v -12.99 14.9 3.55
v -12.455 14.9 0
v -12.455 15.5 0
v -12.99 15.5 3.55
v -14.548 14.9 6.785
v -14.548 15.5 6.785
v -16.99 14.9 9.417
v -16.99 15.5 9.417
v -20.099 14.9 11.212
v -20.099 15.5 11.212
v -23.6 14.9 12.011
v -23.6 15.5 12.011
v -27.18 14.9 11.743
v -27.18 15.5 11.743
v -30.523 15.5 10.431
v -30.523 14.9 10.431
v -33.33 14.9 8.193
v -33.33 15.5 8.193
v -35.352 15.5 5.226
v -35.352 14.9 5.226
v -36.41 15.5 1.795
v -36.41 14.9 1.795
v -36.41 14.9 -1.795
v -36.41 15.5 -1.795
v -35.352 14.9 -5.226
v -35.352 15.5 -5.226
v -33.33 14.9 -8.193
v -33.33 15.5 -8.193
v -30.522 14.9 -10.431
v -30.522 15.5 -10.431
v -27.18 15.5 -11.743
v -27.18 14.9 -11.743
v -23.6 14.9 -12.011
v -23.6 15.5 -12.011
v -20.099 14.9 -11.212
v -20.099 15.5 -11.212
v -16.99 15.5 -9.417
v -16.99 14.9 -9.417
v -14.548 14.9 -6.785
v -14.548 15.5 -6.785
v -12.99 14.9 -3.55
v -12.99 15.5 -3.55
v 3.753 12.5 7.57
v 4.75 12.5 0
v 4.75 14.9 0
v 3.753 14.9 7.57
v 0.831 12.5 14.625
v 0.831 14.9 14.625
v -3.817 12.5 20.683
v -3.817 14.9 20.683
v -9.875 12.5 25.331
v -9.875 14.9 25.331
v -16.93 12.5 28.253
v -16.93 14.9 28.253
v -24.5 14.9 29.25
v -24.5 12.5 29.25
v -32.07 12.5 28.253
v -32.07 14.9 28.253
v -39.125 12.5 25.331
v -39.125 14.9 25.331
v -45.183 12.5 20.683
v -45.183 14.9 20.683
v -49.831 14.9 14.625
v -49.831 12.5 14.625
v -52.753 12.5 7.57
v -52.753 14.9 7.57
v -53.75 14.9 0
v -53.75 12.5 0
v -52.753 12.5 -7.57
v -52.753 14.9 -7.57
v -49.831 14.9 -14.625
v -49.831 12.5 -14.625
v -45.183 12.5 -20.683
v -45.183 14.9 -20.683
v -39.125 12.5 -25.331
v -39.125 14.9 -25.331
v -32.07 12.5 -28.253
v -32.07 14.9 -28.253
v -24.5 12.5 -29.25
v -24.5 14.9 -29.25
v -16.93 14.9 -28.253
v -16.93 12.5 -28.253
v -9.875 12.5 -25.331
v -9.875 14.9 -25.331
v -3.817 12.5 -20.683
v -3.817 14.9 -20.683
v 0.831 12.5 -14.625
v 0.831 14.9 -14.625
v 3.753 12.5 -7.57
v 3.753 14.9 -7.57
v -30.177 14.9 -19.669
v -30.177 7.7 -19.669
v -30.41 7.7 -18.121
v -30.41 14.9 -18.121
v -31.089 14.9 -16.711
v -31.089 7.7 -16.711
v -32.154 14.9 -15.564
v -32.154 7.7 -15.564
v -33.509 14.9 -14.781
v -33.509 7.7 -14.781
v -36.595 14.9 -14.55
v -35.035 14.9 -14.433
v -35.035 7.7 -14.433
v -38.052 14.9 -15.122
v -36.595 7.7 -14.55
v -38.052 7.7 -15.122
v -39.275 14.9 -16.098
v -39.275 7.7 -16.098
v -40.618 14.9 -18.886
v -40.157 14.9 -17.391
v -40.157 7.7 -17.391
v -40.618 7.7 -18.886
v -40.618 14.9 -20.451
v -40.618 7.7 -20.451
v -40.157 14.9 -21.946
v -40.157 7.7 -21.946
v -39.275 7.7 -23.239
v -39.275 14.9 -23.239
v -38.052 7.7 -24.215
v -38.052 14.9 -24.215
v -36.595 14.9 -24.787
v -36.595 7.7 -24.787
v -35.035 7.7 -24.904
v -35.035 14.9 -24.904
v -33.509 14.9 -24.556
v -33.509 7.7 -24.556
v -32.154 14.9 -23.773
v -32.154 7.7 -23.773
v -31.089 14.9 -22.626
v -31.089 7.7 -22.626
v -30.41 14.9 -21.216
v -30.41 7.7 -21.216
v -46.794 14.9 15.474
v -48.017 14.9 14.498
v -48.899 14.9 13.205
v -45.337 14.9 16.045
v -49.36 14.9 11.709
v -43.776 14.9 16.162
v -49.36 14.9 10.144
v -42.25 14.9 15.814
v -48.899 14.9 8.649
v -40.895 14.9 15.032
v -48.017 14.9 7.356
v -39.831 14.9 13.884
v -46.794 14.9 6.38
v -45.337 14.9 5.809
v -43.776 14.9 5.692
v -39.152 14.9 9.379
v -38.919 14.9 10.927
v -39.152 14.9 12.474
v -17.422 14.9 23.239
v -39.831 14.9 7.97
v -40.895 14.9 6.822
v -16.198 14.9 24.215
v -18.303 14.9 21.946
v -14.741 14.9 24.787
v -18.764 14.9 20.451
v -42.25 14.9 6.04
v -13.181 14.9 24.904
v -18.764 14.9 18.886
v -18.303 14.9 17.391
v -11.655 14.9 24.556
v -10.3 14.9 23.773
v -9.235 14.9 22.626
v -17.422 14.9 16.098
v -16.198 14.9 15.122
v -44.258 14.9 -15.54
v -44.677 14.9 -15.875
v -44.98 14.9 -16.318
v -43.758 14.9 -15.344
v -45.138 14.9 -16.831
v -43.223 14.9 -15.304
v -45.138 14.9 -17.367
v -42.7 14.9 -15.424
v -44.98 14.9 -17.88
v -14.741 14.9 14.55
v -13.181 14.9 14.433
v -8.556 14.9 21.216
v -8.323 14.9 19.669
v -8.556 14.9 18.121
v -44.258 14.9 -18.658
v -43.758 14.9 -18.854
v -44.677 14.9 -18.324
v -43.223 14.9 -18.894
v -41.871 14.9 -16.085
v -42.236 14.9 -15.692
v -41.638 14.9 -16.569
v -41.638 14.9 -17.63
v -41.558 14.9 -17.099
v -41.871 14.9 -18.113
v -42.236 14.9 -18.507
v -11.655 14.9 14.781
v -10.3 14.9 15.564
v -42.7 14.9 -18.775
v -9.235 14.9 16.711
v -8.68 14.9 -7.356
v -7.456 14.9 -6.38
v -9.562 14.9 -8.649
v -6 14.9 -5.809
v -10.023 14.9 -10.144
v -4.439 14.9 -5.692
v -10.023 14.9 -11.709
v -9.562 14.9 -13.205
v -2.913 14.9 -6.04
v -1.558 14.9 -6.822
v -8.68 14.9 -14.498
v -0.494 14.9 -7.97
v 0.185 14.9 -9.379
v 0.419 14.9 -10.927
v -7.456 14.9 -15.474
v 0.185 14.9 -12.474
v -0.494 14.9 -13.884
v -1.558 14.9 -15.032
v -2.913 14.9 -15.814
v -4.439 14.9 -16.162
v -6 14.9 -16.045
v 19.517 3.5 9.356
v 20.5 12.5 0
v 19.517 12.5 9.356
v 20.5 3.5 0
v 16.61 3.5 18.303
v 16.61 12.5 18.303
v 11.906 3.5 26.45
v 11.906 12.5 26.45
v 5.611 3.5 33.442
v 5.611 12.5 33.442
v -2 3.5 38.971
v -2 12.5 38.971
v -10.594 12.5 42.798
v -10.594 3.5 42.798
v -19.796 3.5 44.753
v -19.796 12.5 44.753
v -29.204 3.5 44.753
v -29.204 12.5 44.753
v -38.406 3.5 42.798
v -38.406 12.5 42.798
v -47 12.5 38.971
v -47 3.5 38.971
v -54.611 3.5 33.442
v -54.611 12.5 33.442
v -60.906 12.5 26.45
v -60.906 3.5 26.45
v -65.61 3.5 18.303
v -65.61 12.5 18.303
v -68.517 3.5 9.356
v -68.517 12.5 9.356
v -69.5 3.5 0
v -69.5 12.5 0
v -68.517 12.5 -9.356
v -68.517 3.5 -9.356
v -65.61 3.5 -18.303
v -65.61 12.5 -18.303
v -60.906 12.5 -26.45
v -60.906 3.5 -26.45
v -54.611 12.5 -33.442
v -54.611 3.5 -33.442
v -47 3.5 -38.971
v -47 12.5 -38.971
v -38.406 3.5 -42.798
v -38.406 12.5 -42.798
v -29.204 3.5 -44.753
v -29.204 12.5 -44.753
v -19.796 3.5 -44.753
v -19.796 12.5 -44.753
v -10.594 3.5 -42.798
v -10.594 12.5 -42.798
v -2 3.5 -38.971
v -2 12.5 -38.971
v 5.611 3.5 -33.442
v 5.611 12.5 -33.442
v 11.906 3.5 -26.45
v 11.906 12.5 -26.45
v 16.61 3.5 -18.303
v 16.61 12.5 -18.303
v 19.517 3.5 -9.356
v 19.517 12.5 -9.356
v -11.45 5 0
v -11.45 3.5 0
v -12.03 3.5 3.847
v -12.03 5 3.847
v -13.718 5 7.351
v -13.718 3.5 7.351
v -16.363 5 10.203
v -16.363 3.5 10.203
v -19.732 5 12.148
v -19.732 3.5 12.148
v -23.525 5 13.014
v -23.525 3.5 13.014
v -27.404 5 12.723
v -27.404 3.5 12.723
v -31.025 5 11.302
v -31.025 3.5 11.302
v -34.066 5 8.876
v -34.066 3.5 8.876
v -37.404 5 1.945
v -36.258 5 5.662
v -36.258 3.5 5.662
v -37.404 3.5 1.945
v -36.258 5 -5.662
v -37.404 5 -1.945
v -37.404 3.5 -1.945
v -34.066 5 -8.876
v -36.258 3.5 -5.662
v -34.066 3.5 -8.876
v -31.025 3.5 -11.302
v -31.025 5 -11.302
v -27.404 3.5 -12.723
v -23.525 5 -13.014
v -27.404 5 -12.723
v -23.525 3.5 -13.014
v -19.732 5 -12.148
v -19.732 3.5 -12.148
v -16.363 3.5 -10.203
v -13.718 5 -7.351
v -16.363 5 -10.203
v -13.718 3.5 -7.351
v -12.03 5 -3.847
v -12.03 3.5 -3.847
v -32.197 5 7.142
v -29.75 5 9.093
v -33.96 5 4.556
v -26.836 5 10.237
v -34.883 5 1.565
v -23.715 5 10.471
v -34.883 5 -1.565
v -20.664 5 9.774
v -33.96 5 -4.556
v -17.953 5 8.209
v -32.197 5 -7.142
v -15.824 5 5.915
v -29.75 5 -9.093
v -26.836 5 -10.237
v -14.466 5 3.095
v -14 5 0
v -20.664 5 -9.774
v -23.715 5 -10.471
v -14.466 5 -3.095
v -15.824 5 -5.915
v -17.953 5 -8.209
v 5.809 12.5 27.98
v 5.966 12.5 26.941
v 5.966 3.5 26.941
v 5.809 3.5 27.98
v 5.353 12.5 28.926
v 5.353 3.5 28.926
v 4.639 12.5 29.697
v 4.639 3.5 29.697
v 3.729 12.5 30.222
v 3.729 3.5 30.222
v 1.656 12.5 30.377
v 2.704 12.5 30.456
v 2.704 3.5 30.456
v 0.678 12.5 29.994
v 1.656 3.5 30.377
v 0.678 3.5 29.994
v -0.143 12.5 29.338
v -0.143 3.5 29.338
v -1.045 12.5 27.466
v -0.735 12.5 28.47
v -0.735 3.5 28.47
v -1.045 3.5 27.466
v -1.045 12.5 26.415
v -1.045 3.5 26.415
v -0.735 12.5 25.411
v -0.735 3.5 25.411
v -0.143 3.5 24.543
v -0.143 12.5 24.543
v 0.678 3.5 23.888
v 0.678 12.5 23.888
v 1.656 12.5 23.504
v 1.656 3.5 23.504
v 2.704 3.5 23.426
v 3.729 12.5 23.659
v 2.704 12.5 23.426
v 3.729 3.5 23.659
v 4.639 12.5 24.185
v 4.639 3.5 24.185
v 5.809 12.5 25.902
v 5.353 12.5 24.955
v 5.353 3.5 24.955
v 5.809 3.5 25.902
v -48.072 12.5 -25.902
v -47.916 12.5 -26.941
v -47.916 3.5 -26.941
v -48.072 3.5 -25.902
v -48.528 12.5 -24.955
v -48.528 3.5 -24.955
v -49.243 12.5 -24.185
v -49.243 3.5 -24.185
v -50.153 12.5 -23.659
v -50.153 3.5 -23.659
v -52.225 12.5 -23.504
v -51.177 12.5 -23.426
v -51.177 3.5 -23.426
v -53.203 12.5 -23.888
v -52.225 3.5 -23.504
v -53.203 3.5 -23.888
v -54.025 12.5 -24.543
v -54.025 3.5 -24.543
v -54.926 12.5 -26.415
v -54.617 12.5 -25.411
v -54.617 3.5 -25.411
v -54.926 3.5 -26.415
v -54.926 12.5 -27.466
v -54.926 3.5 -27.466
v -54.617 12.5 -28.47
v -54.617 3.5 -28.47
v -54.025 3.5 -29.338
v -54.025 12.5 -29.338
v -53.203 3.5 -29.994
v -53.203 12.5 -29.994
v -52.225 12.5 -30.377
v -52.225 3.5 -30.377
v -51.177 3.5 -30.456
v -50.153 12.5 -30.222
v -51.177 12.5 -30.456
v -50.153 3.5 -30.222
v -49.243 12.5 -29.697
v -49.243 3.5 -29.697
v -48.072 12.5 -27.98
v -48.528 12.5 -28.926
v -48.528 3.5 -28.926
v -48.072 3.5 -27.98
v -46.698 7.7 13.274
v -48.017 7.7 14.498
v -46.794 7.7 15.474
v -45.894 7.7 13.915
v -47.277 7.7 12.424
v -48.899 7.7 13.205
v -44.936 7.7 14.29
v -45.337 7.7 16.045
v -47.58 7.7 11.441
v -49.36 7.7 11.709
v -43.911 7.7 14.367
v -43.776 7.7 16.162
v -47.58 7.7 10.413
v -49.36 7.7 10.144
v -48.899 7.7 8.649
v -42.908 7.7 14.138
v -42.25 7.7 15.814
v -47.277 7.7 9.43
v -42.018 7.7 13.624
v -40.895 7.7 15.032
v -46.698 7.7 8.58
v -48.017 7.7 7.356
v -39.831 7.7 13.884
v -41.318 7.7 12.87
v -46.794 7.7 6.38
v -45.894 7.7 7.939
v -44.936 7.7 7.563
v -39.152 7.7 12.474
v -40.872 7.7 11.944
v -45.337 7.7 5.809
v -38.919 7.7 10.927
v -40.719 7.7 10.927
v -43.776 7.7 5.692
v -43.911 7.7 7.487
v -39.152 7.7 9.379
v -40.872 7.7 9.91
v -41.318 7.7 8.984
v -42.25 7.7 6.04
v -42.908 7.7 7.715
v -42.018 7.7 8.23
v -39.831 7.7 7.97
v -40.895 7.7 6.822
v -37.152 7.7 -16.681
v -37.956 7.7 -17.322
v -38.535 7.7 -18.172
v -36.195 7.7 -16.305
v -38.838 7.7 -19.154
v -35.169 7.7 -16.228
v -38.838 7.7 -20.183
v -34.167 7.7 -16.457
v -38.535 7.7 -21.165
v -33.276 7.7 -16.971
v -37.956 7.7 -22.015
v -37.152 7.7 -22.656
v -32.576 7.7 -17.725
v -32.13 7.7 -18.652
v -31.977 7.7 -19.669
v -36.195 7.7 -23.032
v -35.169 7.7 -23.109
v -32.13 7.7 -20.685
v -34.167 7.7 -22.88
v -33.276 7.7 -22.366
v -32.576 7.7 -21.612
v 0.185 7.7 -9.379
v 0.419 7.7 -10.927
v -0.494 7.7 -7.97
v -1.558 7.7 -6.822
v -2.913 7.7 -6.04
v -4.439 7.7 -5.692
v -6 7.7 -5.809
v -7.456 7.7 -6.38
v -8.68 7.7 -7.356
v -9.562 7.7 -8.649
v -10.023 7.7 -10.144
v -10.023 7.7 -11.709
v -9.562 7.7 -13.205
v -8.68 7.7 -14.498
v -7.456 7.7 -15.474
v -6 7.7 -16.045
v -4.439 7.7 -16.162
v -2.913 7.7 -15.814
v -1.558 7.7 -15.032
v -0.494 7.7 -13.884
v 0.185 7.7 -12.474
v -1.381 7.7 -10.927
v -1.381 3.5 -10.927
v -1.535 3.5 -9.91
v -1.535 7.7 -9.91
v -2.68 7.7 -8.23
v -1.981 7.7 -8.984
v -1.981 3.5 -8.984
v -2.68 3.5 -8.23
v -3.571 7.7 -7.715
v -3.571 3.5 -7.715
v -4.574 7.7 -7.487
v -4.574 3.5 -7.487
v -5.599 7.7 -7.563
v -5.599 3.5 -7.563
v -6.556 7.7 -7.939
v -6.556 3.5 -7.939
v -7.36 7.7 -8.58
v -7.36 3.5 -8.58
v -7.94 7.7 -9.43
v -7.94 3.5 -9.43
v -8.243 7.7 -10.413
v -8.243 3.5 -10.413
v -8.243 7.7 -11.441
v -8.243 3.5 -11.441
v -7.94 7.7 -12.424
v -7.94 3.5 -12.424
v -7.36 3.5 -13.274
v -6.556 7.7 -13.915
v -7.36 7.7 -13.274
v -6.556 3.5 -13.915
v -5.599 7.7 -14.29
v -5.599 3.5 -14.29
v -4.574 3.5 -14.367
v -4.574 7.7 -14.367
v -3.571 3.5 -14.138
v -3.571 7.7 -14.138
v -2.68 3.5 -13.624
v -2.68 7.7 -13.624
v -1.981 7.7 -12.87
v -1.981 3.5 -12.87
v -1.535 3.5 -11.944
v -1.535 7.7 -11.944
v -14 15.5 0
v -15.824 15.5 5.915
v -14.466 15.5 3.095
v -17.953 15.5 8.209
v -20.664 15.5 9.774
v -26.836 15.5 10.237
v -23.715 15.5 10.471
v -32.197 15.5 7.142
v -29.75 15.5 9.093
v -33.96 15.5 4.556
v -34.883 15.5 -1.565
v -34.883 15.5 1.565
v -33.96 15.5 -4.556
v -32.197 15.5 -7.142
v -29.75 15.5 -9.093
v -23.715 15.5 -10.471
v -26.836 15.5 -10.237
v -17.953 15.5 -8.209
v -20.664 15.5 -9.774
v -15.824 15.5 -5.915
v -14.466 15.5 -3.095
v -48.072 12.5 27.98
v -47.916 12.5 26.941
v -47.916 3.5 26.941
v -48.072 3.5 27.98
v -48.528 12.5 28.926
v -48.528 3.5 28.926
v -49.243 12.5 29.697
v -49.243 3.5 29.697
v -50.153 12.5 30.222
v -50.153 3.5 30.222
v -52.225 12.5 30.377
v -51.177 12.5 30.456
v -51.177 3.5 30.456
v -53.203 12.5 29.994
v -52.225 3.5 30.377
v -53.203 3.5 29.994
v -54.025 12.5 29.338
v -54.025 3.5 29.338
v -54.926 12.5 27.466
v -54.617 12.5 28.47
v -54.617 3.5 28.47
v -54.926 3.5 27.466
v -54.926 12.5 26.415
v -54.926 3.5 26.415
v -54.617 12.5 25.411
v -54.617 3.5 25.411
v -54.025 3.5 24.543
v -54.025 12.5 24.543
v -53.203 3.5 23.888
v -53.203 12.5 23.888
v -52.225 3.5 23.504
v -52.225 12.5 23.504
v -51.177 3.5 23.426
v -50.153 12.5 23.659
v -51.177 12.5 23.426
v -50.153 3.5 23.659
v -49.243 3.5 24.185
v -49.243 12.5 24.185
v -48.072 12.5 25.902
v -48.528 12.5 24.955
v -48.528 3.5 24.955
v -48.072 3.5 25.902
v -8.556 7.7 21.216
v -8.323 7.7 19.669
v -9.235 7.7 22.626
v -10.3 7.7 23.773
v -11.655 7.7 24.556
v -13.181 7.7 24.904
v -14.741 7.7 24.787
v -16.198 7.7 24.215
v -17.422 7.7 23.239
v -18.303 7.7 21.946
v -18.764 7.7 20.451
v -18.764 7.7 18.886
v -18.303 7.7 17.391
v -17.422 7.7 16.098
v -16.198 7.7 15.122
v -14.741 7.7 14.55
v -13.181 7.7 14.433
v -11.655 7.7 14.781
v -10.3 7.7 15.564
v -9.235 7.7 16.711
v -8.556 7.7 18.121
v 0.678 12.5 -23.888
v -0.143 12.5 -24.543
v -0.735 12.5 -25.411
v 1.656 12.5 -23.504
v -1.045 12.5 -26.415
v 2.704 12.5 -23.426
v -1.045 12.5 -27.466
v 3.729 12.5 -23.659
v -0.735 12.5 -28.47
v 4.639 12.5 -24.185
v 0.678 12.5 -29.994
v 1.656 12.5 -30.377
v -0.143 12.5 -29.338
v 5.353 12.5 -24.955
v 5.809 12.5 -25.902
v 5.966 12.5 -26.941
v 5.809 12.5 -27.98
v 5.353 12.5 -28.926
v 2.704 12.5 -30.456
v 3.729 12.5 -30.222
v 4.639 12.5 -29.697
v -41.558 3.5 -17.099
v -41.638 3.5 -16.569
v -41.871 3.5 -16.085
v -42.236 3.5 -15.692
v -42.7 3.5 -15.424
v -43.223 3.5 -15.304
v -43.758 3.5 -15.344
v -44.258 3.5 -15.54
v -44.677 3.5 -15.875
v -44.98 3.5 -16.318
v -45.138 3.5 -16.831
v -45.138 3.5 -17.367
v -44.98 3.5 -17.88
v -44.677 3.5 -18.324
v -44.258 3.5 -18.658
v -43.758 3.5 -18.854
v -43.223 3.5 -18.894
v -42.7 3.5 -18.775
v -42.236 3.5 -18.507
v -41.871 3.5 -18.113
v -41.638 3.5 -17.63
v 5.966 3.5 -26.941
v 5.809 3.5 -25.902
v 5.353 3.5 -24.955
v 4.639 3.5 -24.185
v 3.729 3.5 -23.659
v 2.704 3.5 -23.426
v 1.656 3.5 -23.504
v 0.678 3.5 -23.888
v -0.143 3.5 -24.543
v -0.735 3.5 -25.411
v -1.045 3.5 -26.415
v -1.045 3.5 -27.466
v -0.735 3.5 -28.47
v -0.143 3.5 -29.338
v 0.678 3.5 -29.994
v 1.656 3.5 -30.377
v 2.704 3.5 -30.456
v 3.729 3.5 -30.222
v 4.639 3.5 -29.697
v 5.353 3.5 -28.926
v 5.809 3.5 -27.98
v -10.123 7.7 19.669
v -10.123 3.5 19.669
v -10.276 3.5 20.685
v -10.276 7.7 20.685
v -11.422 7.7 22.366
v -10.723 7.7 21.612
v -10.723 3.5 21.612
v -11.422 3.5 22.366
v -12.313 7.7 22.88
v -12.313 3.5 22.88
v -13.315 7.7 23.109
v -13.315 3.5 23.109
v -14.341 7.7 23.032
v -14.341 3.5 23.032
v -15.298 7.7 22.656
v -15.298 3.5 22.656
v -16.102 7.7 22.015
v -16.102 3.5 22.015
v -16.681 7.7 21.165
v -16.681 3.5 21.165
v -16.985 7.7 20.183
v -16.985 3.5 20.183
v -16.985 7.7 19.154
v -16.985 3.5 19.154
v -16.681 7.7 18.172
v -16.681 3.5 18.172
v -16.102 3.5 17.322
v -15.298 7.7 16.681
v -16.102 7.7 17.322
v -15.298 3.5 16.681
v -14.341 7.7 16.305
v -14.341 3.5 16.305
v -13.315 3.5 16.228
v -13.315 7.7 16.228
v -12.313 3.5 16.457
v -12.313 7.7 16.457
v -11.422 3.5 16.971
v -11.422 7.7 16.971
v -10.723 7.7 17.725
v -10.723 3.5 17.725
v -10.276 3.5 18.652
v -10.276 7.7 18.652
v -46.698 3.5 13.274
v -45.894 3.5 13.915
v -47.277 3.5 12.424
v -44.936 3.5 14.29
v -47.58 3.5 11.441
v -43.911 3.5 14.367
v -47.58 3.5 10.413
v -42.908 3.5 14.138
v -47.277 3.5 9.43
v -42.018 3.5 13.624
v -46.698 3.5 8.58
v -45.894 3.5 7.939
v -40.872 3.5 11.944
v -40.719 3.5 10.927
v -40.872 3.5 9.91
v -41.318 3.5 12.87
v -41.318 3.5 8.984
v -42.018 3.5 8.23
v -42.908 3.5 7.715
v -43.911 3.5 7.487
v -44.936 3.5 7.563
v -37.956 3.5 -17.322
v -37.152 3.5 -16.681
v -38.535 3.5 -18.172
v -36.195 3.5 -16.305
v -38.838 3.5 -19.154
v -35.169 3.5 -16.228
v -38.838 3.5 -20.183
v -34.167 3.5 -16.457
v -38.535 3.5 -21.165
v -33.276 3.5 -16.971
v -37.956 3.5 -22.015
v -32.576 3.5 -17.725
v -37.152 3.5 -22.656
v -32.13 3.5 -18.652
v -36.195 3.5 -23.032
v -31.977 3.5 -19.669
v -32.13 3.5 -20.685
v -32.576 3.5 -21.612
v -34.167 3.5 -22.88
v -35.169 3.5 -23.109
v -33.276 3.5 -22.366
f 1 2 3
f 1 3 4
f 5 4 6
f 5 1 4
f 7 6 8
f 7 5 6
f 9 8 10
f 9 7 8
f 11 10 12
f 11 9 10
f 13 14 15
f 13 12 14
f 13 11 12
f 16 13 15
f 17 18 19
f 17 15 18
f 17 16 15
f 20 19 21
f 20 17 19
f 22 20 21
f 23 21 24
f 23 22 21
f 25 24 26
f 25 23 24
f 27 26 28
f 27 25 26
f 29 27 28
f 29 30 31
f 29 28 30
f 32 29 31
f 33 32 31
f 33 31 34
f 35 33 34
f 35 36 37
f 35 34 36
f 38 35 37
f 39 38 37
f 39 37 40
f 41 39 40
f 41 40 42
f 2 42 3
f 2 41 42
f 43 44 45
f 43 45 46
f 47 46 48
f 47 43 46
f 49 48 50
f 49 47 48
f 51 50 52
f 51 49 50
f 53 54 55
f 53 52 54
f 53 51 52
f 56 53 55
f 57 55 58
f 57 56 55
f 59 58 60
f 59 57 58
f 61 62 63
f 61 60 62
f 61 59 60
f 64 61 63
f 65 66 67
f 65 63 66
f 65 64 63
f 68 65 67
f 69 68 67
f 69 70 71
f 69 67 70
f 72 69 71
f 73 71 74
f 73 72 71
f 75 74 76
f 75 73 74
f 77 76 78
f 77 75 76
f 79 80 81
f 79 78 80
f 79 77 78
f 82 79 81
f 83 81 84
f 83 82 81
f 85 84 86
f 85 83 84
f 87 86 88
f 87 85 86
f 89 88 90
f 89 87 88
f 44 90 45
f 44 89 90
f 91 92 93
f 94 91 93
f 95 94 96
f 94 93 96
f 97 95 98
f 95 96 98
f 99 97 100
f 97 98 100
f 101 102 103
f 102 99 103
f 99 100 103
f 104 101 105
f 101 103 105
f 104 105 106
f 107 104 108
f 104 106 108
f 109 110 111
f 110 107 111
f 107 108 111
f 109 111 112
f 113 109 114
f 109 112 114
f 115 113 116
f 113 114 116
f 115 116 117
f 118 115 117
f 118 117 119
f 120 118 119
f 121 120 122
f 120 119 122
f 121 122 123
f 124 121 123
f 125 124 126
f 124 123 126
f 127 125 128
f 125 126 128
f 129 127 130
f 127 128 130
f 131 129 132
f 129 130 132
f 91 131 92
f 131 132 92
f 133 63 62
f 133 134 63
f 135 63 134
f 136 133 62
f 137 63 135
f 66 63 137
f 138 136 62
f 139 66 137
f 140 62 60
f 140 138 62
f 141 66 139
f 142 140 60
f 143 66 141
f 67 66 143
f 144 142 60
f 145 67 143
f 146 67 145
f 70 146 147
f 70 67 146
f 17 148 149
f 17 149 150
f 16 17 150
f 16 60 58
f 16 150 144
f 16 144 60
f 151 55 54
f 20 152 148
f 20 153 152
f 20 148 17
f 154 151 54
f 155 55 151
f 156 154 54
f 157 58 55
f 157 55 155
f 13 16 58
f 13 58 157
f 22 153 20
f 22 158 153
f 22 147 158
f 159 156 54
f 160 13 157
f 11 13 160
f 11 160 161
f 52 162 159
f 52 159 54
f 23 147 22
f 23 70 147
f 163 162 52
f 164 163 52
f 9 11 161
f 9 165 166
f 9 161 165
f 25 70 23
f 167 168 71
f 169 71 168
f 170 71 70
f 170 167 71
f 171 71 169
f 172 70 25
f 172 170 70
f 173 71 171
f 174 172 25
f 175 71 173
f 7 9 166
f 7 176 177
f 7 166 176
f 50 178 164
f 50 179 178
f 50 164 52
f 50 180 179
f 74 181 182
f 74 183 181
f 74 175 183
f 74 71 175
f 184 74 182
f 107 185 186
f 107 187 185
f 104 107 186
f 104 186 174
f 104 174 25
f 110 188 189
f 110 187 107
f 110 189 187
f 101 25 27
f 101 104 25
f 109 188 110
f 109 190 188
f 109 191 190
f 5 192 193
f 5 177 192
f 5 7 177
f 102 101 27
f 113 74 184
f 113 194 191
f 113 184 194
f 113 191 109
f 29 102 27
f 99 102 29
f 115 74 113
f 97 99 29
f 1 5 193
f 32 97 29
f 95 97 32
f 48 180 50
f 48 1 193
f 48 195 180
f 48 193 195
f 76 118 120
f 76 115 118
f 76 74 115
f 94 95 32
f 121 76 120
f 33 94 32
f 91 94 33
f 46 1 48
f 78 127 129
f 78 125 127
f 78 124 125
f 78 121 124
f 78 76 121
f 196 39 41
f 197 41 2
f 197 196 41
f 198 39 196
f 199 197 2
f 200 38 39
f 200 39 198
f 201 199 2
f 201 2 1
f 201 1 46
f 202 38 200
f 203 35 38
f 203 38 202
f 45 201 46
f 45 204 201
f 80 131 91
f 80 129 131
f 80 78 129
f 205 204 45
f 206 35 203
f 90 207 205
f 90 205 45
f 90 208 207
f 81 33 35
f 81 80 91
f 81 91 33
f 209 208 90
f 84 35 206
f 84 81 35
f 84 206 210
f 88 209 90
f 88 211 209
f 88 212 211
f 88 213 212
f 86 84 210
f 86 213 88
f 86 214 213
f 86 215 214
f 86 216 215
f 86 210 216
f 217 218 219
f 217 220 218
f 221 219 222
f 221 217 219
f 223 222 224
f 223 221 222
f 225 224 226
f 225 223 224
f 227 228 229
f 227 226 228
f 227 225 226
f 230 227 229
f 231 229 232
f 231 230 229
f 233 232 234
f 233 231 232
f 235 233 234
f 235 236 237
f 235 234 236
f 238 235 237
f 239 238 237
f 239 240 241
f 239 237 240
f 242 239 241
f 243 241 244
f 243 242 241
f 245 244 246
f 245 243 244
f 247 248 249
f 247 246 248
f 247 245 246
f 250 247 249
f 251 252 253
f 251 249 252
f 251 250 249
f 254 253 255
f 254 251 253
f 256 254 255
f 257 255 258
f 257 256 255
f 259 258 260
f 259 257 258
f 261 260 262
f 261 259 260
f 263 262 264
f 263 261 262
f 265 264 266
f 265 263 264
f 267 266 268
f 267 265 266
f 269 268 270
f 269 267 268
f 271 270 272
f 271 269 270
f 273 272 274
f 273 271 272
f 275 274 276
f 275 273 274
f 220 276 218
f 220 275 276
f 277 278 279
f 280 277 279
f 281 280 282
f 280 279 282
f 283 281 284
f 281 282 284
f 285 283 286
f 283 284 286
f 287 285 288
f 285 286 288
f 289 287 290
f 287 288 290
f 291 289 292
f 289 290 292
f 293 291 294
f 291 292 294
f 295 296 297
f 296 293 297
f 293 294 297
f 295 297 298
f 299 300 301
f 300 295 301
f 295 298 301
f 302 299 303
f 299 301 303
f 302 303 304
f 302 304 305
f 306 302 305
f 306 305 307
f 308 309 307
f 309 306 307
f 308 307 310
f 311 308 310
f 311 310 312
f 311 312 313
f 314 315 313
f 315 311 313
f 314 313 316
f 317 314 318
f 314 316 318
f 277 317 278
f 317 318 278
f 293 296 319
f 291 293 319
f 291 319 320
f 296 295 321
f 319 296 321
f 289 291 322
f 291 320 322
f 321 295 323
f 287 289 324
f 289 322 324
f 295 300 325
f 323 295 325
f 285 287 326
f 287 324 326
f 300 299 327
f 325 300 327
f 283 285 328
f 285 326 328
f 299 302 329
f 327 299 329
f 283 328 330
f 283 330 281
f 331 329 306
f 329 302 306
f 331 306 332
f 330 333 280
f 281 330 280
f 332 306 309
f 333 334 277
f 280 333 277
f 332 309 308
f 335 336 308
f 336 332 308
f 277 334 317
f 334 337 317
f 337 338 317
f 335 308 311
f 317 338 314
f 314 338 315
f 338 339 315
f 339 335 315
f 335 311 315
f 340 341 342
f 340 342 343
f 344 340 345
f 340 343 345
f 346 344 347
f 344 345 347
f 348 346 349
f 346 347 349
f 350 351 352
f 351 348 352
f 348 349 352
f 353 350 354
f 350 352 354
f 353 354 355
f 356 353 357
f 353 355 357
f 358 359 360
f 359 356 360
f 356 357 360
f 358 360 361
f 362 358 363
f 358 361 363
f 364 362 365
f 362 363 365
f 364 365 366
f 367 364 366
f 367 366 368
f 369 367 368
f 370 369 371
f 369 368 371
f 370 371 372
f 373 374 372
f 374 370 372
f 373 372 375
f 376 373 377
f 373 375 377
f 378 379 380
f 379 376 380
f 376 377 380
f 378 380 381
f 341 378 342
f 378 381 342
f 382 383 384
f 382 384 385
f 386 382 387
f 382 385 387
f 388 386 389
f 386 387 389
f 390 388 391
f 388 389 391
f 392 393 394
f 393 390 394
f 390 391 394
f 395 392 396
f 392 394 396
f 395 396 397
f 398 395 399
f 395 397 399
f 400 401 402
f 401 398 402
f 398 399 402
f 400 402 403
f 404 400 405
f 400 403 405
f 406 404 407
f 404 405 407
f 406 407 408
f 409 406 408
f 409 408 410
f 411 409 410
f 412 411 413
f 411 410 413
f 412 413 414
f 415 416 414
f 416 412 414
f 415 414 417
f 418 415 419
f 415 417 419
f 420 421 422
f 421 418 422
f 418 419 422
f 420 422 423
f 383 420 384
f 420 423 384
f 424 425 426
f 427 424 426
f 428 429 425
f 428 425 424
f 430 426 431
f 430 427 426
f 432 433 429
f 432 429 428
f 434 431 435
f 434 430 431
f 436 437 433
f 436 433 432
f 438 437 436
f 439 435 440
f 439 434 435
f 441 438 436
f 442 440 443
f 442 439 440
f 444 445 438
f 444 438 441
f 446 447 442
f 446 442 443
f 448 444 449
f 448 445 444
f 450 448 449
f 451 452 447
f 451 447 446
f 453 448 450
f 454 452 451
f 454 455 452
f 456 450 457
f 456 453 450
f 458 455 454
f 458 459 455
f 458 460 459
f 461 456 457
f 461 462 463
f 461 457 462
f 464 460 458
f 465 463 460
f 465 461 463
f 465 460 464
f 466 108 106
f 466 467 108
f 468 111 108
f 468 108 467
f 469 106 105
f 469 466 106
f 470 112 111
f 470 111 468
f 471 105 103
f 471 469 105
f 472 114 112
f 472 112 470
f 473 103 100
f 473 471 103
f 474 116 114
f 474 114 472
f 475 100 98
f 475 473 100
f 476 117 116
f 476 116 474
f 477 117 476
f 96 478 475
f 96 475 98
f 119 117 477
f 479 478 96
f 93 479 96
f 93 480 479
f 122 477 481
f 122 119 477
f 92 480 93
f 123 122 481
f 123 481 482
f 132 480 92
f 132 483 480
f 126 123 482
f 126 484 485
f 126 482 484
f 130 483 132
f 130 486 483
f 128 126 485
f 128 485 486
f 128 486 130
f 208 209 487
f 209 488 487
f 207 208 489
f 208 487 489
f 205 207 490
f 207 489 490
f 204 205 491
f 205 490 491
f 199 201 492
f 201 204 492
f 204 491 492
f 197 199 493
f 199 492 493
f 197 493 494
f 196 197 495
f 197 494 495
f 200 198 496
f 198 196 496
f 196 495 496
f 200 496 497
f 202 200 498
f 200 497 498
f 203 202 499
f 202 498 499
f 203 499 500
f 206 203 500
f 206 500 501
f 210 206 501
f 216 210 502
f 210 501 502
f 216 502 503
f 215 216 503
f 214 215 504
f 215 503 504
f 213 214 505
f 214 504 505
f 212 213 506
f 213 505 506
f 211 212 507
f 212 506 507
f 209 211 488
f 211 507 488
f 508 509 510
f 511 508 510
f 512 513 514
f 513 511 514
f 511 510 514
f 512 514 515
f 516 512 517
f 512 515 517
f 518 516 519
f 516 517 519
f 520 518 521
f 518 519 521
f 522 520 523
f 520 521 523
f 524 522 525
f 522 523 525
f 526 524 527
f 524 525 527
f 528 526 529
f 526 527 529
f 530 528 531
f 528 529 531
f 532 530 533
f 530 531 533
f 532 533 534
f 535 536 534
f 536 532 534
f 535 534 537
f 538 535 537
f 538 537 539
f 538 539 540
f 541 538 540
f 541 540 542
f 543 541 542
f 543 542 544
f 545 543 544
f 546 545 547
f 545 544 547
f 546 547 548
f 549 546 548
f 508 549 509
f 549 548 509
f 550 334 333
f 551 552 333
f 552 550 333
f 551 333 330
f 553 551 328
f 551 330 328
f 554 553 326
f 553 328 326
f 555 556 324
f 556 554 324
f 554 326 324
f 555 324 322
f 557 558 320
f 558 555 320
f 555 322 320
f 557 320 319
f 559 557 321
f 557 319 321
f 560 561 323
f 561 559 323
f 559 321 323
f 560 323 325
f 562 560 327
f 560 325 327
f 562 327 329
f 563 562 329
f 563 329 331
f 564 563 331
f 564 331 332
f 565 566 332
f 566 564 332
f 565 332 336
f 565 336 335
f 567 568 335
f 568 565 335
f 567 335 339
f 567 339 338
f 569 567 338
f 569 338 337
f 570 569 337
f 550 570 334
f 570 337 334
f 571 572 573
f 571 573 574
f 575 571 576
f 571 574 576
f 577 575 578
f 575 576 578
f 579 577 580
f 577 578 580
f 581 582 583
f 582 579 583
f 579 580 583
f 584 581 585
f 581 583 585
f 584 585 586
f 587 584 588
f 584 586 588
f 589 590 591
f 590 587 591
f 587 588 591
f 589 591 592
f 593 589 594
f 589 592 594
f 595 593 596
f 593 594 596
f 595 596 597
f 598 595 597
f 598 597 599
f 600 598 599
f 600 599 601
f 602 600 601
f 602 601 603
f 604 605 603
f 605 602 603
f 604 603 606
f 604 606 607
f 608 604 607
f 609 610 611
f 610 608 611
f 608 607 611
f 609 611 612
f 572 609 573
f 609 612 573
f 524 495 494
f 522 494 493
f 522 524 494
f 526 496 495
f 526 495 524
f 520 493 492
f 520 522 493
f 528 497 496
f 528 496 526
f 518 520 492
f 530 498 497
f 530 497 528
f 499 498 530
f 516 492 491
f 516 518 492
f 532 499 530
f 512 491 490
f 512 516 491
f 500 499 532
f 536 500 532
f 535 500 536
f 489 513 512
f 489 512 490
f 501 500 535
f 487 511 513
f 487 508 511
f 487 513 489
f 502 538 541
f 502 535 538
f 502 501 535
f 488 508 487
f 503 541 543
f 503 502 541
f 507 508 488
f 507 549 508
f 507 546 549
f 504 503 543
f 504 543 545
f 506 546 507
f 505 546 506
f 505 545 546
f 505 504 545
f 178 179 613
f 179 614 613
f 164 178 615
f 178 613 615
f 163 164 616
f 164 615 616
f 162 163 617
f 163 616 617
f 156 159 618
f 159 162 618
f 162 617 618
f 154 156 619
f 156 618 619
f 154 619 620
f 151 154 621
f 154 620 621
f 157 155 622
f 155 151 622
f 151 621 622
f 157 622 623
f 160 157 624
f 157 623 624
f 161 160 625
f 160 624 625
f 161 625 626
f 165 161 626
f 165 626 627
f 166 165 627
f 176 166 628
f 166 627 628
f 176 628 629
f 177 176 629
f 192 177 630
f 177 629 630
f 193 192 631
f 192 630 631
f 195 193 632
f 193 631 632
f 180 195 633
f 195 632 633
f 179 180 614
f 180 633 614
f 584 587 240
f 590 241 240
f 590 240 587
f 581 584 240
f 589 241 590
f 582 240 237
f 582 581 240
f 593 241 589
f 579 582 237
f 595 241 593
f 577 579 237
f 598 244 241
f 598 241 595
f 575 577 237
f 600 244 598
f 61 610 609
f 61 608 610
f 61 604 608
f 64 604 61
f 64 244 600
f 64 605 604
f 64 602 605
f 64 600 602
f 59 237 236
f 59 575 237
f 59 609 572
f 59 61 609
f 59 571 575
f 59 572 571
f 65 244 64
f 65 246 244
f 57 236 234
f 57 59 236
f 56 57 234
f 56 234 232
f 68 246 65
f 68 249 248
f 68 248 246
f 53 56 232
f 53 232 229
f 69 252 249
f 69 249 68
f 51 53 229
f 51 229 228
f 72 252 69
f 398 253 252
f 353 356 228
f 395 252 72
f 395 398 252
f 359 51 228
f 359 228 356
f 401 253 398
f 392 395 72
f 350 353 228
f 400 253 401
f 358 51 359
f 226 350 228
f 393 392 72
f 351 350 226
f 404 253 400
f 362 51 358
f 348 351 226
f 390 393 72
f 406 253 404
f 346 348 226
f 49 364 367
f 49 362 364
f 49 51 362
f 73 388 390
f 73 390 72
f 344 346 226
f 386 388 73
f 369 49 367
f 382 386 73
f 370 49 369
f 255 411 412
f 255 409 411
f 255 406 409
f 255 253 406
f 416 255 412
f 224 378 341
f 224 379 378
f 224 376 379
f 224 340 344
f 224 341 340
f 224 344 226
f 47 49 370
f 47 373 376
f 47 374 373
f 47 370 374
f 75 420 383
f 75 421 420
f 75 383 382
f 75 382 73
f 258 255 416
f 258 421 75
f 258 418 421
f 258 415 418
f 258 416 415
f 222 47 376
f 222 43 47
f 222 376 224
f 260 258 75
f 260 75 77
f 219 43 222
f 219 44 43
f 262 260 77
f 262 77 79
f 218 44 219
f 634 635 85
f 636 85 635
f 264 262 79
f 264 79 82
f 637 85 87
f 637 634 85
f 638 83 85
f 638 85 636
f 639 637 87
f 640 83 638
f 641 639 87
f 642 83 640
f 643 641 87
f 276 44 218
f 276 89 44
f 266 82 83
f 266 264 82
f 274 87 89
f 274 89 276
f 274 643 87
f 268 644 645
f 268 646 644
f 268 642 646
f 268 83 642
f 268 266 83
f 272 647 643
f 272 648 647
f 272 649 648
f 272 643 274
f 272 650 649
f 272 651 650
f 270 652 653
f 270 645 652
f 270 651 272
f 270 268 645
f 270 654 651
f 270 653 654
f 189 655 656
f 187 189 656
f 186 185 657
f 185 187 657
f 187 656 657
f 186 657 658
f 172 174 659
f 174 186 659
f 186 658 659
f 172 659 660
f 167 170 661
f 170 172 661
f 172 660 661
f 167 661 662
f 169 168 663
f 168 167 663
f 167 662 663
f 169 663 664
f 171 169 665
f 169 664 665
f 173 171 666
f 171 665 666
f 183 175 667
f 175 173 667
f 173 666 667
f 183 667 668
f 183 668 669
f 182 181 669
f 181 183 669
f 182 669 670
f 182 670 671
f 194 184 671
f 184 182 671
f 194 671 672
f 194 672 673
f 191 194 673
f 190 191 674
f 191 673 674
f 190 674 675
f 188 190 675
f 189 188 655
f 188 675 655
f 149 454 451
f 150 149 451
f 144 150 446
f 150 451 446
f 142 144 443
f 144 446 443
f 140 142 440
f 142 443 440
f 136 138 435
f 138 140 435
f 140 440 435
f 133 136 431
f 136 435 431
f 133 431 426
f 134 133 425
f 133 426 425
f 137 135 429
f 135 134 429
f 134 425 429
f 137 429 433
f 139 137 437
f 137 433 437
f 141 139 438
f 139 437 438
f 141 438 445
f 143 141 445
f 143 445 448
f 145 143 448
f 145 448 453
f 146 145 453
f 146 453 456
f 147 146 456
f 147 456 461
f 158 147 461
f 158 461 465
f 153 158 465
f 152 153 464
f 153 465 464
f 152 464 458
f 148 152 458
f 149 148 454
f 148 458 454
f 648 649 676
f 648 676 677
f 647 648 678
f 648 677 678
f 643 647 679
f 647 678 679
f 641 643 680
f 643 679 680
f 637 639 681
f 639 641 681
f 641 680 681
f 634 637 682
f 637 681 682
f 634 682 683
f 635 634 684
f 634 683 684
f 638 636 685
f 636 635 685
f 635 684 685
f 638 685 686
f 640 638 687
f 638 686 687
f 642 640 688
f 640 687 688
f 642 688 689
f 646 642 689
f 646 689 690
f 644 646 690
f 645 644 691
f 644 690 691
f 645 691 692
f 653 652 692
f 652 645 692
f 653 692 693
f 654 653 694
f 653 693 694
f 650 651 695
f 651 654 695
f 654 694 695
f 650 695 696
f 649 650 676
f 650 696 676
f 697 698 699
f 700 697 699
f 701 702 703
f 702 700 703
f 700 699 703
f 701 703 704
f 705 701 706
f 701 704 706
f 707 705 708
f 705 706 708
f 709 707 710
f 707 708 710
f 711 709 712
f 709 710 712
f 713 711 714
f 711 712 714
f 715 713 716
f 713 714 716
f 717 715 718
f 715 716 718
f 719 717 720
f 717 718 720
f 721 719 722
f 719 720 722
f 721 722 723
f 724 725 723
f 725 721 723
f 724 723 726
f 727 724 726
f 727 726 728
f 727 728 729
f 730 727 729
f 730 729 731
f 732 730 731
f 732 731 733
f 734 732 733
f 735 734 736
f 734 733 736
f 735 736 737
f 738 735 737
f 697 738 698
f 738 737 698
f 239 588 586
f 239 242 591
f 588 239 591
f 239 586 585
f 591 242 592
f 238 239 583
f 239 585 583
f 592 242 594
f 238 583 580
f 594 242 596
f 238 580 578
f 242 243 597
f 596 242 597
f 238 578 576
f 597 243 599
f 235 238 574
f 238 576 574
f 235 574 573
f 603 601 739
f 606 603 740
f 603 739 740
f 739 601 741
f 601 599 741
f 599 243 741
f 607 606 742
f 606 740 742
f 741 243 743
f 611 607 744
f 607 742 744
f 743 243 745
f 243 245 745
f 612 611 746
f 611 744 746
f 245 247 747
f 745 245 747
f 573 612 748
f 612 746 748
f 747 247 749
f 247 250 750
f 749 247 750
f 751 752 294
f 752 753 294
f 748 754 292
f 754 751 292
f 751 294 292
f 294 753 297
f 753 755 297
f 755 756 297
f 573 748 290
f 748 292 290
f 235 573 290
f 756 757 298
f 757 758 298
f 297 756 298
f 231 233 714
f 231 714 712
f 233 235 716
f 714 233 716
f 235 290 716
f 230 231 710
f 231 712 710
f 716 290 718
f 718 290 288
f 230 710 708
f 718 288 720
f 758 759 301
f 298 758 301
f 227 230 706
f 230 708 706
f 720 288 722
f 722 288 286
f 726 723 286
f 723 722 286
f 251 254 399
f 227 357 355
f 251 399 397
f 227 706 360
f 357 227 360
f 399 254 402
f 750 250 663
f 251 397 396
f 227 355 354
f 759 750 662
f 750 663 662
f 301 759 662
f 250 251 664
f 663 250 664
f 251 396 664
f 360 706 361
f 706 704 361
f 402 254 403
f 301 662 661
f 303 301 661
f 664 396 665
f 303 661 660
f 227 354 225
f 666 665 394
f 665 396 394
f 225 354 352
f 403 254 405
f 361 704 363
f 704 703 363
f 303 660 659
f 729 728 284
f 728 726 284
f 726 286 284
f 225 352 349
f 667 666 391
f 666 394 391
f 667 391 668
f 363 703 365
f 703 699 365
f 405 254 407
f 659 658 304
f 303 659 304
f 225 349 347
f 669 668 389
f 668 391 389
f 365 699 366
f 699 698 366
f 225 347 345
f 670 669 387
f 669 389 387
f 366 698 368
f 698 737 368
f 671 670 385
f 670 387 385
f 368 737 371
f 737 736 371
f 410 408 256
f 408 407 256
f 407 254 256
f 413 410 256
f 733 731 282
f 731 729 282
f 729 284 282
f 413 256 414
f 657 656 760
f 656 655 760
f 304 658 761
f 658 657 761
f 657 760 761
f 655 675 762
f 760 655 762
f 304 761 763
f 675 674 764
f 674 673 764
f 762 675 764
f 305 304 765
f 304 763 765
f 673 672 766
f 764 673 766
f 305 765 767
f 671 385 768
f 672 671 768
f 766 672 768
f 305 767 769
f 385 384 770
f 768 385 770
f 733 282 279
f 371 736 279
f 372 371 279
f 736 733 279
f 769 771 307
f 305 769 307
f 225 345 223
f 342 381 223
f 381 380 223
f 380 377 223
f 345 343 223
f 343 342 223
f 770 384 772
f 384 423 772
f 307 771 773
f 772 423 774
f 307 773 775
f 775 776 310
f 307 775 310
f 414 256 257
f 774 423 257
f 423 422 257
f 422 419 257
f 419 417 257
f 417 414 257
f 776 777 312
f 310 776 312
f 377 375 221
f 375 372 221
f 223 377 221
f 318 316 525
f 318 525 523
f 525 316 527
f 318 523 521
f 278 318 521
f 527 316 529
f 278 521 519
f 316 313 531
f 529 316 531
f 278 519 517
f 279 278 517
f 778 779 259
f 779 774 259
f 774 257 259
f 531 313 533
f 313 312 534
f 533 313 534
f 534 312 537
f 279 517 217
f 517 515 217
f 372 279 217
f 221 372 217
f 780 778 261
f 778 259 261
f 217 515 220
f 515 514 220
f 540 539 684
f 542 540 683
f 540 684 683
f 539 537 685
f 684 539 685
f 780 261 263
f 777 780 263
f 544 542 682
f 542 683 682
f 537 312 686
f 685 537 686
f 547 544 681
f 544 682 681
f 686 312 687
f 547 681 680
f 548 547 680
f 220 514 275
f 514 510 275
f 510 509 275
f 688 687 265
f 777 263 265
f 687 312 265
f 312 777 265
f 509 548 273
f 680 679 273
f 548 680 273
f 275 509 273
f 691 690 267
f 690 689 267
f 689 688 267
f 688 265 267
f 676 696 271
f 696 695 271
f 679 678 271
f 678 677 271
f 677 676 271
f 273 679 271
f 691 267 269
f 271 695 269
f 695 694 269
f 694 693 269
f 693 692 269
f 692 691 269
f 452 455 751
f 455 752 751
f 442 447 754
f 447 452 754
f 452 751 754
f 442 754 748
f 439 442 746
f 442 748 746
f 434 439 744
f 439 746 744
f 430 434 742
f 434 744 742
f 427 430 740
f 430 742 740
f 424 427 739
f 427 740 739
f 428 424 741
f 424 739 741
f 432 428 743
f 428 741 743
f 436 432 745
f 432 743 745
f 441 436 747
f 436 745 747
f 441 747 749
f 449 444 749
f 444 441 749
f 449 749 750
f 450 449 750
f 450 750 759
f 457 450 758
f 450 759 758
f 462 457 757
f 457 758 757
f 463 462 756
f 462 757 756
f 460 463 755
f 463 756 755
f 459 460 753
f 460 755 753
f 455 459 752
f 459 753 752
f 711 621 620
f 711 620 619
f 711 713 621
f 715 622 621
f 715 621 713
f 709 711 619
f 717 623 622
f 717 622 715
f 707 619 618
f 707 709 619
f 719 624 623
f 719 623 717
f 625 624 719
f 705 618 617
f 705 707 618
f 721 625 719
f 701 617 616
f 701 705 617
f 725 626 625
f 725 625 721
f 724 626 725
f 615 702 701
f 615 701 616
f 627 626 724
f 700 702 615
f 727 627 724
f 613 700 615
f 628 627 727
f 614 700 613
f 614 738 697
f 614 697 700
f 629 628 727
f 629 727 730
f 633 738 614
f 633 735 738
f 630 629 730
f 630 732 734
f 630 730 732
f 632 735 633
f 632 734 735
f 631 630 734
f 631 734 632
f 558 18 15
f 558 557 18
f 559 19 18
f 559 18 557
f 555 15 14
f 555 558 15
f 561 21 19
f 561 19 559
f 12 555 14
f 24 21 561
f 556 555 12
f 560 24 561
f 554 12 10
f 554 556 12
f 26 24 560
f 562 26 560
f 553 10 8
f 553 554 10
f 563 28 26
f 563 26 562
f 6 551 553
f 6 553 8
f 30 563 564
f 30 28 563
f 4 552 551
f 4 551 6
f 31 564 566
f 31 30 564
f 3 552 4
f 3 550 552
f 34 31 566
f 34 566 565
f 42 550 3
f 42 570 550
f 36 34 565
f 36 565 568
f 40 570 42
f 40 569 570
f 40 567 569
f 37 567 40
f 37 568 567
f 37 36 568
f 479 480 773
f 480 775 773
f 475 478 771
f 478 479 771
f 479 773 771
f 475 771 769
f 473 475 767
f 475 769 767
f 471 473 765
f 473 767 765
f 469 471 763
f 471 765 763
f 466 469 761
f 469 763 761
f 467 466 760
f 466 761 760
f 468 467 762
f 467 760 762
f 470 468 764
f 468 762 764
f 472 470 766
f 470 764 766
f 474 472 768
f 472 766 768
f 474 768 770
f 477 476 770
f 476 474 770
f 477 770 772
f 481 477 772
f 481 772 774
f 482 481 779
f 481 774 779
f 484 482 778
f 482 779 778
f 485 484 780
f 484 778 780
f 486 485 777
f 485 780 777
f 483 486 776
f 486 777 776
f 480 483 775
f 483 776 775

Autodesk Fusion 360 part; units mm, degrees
sketch "Sketch1" plane through (0, 0, 0) normal (0, 1, 0) x (1, 0, 0)
  circle A0 centre (0, 0) radius 150
  circle A1 centre (-36.4232, 65.5618) radius 11.5
  circle A2 centre (-36.4232, 65.5618) radius 17.5
  circle A3 centre (-65.5618, -36.4232) radius 17.5
  circle A4 centre (-65.5618, -36.4232) radius 11.5
  circle A5 centre (36.4232, -65.5618) radius 17.5
  circle A6 centre (36.4232, -65.5618) radius 11.5
  circle A7 centre (65.5618, 36.4232) radius 17.5
  circle A8 centre (65.5618, 36.4232) radius 11.5
  circle A9 centre (0, 0) radius 35
  circle A10 centre (0, 0) radius 40.15
  circle A11 centre (0, 0) radius 43.5
  circle A12 centre (0, 0) radius 97.5
  line L0 (0, 0) -> (169.7056, 0) construction
  circle A13 centre (-89.8026, 89.8026) radius 11.75
  circle A14 centre (-89.8026, -89.8026) radius 11.75
  circle A15 centre (89.8026, -89.8026) radius 11.75
  circle A16 centre (89.8026, 89.8026) radius 11.75
  circle A17 centre (-62.8594, 56.9974) radius 6
  dimension "d13" = 300
  dimension "d17" = 23
  dimension "d18" = 35
  dimension "d21" = 70
  dimension "d22" = 80.3
  dimension "d23" = 87
  dimension "d24" = 195
  dimension "d26" = 23.5
  dimension "d28" = 360
  dimension "d31" = 12
extrude "Extrude1" add sketch "Sketch1" along normal blind 40 contours A10 makes body 1
extrude "Extrude2" add sketch "Sketch1" along normal blind 38 contours A11 | A12 bodies 1
extrude "Extrude3" add sketch "Sketch1" along normal blind 30 contours A0 bodies 1
extrude "Extrude4" add sketch "Sketch1" along normal blind 5 separate body contours A10 | A11 makes body 2
combine "Combine1" operation cut target body 1 tool bodies 2
extrude "Extrude5" add sketch "Sketch1" along normal blind 14 separate body contours A2 | A3 | A5 | A7 makes body 3 at (83.04, 4.6667, -35.5509) makes body 4 at (-48.0835, 4.6667, 37.2955) makes body 5 at (-18.945, 4.6667, -64.6895) makes body 6 at (53.8363, 9.3333, 67.3042)
combine "Combine2" operation add target body 1 tool bodies 3 5 4 6
scale "Scale1" factor 0.2 about (-35, 5, 0) bodies 1
scale "Scale2" factor 1.5 about (-35, 5, 0) bodies 1
